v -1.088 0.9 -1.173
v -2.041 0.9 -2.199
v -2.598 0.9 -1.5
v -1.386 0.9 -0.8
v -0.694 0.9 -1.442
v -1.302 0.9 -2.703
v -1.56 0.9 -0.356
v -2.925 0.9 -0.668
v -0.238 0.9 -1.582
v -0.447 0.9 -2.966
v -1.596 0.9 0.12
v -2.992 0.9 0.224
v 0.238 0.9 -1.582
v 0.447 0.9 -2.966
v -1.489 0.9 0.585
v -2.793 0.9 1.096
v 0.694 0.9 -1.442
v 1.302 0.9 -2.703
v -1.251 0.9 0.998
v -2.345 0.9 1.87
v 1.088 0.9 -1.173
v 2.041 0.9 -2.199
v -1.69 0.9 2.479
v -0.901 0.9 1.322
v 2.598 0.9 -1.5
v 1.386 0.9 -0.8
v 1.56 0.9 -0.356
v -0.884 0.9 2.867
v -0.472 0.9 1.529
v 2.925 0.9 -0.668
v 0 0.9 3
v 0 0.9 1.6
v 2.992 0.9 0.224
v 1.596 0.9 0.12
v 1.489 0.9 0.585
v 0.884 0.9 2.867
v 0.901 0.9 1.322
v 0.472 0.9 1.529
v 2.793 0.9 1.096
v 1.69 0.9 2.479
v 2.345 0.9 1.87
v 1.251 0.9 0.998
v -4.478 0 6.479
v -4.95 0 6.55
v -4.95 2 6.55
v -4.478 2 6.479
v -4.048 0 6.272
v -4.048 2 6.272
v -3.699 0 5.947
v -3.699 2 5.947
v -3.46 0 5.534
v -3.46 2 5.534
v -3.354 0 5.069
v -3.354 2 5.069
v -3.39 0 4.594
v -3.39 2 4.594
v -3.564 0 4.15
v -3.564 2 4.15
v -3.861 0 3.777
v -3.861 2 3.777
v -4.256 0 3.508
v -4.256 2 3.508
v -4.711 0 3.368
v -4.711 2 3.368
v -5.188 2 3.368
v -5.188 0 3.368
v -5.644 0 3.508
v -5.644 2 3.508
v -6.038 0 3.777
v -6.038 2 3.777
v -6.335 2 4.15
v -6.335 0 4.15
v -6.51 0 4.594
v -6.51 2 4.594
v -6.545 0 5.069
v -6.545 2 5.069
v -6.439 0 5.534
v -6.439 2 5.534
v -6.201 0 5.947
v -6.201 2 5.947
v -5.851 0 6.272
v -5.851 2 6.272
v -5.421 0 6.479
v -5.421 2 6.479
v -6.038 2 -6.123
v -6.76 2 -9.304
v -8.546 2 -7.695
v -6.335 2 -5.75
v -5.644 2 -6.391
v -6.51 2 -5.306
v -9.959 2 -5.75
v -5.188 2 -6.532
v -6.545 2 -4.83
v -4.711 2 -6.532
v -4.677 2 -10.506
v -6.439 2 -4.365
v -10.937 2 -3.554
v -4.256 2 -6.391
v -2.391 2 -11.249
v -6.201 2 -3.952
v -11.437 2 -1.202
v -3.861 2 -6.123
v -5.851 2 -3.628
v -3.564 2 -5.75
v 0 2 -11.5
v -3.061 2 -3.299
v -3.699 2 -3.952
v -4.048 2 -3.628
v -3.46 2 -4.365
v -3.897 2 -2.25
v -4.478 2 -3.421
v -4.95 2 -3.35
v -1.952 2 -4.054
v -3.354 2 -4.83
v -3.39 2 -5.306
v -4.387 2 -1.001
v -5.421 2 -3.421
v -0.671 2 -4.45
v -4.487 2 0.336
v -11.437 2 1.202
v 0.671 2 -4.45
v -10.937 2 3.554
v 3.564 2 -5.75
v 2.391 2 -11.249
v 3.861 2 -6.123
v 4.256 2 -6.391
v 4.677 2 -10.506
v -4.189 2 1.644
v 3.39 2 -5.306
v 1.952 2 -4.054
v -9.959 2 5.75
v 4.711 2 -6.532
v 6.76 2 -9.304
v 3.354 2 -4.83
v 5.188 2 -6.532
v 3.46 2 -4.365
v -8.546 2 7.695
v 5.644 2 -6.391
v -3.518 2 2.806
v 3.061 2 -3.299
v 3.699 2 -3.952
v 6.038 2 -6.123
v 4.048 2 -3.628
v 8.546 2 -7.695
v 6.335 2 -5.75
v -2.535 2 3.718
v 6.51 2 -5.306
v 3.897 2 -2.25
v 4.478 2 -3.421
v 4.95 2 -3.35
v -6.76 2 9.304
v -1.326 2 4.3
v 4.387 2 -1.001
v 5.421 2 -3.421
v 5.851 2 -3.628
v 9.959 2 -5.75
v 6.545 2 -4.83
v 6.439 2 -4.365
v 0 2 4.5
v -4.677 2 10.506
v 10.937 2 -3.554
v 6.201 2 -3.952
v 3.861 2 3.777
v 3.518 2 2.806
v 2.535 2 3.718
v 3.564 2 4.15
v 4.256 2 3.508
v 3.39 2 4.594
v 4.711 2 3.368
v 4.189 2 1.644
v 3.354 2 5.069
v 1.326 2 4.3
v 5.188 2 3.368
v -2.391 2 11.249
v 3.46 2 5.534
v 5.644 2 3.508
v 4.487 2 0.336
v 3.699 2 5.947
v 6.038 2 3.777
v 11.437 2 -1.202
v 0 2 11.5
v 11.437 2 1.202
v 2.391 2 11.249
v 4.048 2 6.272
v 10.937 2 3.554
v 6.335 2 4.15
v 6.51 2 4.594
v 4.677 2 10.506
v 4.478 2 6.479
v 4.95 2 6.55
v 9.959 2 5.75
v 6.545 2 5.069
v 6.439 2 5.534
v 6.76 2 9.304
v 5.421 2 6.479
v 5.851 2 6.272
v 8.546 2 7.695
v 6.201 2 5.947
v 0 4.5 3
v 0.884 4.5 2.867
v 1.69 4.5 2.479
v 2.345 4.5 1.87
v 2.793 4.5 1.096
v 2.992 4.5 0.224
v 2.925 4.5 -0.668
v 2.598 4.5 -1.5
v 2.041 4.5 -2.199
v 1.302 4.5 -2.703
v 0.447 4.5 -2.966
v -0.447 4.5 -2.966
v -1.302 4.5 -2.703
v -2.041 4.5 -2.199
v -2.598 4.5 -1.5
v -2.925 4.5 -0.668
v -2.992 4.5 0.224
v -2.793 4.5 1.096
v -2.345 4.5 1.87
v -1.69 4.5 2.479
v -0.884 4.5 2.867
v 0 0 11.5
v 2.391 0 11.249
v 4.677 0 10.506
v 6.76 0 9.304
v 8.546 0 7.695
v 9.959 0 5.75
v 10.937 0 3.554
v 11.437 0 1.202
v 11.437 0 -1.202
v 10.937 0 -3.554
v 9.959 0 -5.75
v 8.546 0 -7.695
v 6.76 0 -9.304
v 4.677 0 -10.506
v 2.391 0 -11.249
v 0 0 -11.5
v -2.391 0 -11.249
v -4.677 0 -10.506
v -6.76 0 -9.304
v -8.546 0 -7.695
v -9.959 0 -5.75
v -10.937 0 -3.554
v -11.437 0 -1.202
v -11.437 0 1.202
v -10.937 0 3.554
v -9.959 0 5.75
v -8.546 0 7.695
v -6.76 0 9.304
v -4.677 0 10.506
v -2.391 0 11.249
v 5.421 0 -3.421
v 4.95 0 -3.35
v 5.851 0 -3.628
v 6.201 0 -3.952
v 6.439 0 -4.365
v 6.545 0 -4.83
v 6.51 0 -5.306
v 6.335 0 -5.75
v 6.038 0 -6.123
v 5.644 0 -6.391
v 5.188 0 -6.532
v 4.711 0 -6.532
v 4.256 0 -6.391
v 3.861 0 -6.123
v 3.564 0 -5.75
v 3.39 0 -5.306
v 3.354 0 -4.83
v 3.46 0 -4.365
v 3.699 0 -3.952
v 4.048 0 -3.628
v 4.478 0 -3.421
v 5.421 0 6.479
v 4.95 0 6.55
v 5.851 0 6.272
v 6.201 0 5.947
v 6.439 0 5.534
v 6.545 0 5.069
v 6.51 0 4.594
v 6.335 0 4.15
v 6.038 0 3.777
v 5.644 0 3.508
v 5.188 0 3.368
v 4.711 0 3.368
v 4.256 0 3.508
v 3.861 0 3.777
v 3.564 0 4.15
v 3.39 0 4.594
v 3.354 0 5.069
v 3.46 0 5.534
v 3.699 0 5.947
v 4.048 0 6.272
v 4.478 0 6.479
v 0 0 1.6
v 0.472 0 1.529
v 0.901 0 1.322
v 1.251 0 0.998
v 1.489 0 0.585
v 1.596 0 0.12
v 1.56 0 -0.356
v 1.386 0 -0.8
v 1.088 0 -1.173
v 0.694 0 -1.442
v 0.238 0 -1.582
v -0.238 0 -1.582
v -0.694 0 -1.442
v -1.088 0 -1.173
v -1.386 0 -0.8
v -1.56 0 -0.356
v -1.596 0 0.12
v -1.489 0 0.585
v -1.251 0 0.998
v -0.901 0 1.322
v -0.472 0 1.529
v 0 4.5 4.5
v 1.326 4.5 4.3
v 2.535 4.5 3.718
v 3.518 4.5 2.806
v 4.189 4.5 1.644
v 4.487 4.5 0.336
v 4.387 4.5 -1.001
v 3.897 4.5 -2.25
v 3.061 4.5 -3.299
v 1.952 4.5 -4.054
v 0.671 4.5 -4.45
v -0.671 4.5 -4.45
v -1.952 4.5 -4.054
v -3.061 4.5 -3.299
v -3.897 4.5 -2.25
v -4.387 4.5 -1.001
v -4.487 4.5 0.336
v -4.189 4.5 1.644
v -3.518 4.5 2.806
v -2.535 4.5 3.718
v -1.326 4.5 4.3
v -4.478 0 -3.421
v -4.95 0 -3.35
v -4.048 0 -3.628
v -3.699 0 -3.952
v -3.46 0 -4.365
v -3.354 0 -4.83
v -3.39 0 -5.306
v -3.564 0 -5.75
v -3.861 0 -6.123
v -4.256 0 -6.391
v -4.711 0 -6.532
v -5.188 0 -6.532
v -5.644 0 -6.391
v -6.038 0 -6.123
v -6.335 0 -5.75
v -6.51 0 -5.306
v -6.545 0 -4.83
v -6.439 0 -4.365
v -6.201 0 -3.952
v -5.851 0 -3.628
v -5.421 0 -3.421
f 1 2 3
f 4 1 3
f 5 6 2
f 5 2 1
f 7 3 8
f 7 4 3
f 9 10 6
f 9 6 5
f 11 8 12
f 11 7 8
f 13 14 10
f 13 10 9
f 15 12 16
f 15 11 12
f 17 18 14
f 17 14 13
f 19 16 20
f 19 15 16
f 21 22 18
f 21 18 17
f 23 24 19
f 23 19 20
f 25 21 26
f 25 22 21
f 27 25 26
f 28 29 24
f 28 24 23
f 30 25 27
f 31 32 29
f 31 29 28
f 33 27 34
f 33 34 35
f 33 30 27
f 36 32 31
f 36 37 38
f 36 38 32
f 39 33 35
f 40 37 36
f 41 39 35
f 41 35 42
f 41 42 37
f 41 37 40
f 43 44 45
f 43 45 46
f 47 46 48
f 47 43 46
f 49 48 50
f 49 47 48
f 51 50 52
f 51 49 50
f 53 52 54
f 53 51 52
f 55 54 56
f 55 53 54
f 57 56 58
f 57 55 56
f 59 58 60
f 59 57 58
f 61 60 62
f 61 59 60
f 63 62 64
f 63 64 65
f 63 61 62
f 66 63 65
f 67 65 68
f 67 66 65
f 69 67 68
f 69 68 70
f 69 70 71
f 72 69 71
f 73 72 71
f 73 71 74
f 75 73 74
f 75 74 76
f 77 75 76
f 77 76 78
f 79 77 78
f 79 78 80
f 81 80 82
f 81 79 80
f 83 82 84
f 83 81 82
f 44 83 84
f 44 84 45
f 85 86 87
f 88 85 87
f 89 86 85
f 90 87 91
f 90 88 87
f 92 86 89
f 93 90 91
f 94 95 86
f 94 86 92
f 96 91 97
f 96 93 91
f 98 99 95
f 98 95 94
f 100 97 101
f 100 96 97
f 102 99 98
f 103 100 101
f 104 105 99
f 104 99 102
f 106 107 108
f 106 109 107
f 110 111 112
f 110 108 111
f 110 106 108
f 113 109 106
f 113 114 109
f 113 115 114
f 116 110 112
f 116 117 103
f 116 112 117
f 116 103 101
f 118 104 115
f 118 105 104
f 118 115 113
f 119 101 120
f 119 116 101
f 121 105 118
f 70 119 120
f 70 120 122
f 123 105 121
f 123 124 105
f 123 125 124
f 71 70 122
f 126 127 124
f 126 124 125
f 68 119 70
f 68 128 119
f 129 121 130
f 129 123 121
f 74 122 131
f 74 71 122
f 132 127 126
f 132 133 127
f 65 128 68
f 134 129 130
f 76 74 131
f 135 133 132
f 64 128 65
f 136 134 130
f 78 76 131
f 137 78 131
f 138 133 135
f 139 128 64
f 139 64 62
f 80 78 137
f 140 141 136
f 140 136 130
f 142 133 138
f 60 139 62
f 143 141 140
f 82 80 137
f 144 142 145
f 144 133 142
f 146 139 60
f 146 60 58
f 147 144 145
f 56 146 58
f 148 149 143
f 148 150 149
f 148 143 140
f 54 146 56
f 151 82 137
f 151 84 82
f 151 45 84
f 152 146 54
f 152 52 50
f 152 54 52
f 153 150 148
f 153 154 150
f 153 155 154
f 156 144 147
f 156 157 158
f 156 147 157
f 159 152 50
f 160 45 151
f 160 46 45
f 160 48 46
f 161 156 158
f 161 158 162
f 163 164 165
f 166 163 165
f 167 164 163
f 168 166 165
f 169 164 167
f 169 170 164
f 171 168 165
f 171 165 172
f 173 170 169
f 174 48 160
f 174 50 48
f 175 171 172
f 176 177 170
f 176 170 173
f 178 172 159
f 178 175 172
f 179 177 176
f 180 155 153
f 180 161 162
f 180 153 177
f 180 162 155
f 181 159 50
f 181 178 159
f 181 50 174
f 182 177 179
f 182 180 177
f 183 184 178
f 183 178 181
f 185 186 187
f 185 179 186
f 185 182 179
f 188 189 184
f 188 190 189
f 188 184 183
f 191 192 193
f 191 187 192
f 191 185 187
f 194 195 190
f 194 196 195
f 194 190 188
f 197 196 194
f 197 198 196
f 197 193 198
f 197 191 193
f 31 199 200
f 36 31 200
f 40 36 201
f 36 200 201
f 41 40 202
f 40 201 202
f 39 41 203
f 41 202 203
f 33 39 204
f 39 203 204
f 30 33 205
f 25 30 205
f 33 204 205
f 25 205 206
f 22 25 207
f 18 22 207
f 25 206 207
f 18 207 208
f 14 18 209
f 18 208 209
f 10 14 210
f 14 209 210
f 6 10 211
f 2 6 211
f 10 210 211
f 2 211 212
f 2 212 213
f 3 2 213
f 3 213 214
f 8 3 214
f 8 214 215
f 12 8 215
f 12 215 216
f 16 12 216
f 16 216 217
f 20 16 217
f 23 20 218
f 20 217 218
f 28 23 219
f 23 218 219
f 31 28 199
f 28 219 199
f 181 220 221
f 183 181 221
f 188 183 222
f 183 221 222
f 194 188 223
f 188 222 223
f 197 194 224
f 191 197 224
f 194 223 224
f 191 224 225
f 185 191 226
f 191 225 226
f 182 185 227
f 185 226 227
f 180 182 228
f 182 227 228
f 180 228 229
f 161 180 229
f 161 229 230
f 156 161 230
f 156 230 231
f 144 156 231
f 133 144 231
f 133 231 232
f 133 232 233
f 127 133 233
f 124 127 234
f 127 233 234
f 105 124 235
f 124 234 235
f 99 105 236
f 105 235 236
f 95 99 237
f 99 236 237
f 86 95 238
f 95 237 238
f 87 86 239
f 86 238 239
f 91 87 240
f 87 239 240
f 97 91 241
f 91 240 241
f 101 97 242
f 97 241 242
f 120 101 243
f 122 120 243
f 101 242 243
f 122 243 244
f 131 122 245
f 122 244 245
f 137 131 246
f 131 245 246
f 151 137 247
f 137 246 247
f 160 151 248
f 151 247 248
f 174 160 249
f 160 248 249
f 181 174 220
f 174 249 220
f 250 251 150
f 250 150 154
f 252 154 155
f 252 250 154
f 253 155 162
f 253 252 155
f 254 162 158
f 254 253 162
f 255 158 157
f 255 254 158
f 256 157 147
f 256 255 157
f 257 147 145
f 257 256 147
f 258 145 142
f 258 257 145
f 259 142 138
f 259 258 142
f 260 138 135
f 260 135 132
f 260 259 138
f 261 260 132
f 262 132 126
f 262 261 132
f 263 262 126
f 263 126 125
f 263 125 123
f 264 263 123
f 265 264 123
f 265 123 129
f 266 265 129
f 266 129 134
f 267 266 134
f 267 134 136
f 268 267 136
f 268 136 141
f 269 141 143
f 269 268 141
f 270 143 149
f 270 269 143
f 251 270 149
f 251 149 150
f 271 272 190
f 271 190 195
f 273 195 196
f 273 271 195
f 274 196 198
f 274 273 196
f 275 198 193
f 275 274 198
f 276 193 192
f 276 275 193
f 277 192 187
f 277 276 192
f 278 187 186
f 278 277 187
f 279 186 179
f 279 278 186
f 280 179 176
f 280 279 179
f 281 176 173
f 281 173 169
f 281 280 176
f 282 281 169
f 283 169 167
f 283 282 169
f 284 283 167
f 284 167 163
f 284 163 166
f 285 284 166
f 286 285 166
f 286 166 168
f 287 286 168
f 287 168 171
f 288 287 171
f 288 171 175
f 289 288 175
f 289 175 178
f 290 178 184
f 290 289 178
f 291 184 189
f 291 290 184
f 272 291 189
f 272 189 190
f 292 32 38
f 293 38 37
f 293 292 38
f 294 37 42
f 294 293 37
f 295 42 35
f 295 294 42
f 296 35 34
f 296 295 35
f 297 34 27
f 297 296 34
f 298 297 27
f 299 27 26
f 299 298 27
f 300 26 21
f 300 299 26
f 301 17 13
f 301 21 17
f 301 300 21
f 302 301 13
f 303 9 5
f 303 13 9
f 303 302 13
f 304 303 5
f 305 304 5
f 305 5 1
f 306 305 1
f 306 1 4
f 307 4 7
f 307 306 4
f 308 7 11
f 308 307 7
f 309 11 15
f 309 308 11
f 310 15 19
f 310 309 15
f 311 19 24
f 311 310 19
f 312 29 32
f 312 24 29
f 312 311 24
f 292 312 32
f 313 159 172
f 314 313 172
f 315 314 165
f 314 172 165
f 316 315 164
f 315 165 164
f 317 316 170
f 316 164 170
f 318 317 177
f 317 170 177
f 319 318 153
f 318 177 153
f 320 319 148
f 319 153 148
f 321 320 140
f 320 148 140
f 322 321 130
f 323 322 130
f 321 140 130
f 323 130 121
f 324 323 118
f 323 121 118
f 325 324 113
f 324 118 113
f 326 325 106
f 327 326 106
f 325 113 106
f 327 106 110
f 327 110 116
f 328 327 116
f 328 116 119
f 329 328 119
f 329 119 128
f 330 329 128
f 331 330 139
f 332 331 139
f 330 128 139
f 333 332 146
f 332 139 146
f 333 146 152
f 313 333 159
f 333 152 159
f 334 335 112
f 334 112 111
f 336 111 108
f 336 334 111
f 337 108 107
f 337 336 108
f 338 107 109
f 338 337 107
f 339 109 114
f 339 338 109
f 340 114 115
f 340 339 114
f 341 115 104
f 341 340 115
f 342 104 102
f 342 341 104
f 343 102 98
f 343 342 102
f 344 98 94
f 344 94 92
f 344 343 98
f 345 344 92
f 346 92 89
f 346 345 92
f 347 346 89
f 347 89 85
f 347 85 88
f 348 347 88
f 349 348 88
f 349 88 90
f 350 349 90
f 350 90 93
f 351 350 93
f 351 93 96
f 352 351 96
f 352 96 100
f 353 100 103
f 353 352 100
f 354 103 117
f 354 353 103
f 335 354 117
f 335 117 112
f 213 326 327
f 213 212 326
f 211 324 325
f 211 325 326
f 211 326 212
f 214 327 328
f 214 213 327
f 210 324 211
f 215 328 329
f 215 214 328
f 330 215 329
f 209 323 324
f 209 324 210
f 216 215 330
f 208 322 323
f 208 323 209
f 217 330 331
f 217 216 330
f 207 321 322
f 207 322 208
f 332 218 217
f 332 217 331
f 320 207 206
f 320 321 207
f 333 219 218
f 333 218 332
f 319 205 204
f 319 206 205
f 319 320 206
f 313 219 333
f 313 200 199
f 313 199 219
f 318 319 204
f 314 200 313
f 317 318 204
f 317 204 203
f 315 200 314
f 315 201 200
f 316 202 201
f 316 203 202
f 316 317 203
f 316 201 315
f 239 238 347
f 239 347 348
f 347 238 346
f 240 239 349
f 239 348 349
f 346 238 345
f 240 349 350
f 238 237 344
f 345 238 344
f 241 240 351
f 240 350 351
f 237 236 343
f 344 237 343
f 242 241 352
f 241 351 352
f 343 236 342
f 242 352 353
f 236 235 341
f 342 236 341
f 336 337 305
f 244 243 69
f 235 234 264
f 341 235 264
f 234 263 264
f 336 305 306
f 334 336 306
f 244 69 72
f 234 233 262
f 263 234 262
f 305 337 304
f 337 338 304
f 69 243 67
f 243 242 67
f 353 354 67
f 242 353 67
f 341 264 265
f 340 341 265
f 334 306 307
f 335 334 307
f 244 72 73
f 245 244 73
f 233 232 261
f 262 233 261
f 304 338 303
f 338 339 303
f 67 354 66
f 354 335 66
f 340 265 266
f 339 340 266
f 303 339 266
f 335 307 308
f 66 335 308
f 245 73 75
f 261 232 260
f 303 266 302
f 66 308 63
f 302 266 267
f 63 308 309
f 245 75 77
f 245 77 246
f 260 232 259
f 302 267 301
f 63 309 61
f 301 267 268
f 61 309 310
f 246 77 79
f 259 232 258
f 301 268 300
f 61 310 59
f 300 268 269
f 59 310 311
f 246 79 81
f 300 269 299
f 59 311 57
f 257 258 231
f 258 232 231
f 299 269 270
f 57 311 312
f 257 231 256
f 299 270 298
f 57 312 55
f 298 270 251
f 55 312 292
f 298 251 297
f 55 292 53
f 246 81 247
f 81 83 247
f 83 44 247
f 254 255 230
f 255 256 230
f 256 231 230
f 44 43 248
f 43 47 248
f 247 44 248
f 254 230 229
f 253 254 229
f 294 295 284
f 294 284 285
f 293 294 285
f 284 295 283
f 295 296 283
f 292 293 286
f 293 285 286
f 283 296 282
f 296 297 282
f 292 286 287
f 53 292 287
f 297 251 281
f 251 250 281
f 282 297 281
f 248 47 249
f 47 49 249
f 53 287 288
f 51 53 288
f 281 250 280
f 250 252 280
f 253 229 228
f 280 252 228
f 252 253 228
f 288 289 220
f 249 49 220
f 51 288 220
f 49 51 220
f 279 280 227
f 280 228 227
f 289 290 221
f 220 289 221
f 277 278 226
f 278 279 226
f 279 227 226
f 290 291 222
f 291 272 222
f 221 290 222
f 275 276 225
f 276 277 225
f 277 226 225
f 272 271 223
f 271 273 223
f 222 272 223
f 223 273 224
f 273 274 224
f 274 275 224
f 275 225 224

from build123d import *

# Parameters (mm, degrees)
SKETCH1_R           = 11.5
SKETCH1_R_2         = 1.6
BOSS_EXTRUDE1_DEPTH = 2
SKETCH2_R           = 4.5
SKETCH2_R_2         = 1.6
BOSS_EXTRUDE2_DEPTH = 2.5
SKETCH3_R           = 3
CUT_EXTRUDE1_DEPTH  = 3.6


with BuildPart() as part:
    # Sketch1 → Boss-Extrude1 (new body)
    with BuildSketch(Plane(origin=(0, 0, 0), x_dir=(1, 0, 0), z_dir=(0, 1, 0))):
        Circle(SKETCH1_R)
        with Locations((-4.949747468, 4.949747468)):
            Circle(SKETCH1_R_2, mode=Mode.SUBTRACT)
        with Locations((4.949747468, 4.949747468)):
            Circle(SKETCH1_R_2, mode=Mode.SUBTRACT)
        with Locations((4.949747468, -4.949747468)):
            Circle(SKETCH1_R_2, mode=Mode.SUBTRACT)
        with Locations((-4.949747468, -4.949747468)):
            Circle(SKETCH1_R_2, mode=Mode.SUBTRACT)
        Circle(SKETCH1_R_2, mode=Mode.SUBTRACT)
    extrude(amount=BOSS_EXTRUDE1_DEPTH)

    # Sketch2 → Boss-Extrude2 (add)
    with BuildSketch(Plane(origin=(0, 2, 0), x_dir=(1, 0, 0), z_dir=(0, 1, 0))):
        Circle(SKETCH2_R)
        Circle(SKETCH2_R_2, mode=Mode.SUBTRACT)
    extrude(amount=BOSS_EXTRUDE2_DEPTH)

    # Sketch3 → Cut-Extrude1 (cut)
    with BuildSketch(Plane(origin=(0, 4.5, 0), x_dir=(1, 0, 0), z_dir=(0, 1, 0))):
        Circle(SKETCH3_R)
    extrude(amount=-CUT_EXTRUDE1_DEPTH, mode=Mode.SUBTRACT)


solid = part.part
